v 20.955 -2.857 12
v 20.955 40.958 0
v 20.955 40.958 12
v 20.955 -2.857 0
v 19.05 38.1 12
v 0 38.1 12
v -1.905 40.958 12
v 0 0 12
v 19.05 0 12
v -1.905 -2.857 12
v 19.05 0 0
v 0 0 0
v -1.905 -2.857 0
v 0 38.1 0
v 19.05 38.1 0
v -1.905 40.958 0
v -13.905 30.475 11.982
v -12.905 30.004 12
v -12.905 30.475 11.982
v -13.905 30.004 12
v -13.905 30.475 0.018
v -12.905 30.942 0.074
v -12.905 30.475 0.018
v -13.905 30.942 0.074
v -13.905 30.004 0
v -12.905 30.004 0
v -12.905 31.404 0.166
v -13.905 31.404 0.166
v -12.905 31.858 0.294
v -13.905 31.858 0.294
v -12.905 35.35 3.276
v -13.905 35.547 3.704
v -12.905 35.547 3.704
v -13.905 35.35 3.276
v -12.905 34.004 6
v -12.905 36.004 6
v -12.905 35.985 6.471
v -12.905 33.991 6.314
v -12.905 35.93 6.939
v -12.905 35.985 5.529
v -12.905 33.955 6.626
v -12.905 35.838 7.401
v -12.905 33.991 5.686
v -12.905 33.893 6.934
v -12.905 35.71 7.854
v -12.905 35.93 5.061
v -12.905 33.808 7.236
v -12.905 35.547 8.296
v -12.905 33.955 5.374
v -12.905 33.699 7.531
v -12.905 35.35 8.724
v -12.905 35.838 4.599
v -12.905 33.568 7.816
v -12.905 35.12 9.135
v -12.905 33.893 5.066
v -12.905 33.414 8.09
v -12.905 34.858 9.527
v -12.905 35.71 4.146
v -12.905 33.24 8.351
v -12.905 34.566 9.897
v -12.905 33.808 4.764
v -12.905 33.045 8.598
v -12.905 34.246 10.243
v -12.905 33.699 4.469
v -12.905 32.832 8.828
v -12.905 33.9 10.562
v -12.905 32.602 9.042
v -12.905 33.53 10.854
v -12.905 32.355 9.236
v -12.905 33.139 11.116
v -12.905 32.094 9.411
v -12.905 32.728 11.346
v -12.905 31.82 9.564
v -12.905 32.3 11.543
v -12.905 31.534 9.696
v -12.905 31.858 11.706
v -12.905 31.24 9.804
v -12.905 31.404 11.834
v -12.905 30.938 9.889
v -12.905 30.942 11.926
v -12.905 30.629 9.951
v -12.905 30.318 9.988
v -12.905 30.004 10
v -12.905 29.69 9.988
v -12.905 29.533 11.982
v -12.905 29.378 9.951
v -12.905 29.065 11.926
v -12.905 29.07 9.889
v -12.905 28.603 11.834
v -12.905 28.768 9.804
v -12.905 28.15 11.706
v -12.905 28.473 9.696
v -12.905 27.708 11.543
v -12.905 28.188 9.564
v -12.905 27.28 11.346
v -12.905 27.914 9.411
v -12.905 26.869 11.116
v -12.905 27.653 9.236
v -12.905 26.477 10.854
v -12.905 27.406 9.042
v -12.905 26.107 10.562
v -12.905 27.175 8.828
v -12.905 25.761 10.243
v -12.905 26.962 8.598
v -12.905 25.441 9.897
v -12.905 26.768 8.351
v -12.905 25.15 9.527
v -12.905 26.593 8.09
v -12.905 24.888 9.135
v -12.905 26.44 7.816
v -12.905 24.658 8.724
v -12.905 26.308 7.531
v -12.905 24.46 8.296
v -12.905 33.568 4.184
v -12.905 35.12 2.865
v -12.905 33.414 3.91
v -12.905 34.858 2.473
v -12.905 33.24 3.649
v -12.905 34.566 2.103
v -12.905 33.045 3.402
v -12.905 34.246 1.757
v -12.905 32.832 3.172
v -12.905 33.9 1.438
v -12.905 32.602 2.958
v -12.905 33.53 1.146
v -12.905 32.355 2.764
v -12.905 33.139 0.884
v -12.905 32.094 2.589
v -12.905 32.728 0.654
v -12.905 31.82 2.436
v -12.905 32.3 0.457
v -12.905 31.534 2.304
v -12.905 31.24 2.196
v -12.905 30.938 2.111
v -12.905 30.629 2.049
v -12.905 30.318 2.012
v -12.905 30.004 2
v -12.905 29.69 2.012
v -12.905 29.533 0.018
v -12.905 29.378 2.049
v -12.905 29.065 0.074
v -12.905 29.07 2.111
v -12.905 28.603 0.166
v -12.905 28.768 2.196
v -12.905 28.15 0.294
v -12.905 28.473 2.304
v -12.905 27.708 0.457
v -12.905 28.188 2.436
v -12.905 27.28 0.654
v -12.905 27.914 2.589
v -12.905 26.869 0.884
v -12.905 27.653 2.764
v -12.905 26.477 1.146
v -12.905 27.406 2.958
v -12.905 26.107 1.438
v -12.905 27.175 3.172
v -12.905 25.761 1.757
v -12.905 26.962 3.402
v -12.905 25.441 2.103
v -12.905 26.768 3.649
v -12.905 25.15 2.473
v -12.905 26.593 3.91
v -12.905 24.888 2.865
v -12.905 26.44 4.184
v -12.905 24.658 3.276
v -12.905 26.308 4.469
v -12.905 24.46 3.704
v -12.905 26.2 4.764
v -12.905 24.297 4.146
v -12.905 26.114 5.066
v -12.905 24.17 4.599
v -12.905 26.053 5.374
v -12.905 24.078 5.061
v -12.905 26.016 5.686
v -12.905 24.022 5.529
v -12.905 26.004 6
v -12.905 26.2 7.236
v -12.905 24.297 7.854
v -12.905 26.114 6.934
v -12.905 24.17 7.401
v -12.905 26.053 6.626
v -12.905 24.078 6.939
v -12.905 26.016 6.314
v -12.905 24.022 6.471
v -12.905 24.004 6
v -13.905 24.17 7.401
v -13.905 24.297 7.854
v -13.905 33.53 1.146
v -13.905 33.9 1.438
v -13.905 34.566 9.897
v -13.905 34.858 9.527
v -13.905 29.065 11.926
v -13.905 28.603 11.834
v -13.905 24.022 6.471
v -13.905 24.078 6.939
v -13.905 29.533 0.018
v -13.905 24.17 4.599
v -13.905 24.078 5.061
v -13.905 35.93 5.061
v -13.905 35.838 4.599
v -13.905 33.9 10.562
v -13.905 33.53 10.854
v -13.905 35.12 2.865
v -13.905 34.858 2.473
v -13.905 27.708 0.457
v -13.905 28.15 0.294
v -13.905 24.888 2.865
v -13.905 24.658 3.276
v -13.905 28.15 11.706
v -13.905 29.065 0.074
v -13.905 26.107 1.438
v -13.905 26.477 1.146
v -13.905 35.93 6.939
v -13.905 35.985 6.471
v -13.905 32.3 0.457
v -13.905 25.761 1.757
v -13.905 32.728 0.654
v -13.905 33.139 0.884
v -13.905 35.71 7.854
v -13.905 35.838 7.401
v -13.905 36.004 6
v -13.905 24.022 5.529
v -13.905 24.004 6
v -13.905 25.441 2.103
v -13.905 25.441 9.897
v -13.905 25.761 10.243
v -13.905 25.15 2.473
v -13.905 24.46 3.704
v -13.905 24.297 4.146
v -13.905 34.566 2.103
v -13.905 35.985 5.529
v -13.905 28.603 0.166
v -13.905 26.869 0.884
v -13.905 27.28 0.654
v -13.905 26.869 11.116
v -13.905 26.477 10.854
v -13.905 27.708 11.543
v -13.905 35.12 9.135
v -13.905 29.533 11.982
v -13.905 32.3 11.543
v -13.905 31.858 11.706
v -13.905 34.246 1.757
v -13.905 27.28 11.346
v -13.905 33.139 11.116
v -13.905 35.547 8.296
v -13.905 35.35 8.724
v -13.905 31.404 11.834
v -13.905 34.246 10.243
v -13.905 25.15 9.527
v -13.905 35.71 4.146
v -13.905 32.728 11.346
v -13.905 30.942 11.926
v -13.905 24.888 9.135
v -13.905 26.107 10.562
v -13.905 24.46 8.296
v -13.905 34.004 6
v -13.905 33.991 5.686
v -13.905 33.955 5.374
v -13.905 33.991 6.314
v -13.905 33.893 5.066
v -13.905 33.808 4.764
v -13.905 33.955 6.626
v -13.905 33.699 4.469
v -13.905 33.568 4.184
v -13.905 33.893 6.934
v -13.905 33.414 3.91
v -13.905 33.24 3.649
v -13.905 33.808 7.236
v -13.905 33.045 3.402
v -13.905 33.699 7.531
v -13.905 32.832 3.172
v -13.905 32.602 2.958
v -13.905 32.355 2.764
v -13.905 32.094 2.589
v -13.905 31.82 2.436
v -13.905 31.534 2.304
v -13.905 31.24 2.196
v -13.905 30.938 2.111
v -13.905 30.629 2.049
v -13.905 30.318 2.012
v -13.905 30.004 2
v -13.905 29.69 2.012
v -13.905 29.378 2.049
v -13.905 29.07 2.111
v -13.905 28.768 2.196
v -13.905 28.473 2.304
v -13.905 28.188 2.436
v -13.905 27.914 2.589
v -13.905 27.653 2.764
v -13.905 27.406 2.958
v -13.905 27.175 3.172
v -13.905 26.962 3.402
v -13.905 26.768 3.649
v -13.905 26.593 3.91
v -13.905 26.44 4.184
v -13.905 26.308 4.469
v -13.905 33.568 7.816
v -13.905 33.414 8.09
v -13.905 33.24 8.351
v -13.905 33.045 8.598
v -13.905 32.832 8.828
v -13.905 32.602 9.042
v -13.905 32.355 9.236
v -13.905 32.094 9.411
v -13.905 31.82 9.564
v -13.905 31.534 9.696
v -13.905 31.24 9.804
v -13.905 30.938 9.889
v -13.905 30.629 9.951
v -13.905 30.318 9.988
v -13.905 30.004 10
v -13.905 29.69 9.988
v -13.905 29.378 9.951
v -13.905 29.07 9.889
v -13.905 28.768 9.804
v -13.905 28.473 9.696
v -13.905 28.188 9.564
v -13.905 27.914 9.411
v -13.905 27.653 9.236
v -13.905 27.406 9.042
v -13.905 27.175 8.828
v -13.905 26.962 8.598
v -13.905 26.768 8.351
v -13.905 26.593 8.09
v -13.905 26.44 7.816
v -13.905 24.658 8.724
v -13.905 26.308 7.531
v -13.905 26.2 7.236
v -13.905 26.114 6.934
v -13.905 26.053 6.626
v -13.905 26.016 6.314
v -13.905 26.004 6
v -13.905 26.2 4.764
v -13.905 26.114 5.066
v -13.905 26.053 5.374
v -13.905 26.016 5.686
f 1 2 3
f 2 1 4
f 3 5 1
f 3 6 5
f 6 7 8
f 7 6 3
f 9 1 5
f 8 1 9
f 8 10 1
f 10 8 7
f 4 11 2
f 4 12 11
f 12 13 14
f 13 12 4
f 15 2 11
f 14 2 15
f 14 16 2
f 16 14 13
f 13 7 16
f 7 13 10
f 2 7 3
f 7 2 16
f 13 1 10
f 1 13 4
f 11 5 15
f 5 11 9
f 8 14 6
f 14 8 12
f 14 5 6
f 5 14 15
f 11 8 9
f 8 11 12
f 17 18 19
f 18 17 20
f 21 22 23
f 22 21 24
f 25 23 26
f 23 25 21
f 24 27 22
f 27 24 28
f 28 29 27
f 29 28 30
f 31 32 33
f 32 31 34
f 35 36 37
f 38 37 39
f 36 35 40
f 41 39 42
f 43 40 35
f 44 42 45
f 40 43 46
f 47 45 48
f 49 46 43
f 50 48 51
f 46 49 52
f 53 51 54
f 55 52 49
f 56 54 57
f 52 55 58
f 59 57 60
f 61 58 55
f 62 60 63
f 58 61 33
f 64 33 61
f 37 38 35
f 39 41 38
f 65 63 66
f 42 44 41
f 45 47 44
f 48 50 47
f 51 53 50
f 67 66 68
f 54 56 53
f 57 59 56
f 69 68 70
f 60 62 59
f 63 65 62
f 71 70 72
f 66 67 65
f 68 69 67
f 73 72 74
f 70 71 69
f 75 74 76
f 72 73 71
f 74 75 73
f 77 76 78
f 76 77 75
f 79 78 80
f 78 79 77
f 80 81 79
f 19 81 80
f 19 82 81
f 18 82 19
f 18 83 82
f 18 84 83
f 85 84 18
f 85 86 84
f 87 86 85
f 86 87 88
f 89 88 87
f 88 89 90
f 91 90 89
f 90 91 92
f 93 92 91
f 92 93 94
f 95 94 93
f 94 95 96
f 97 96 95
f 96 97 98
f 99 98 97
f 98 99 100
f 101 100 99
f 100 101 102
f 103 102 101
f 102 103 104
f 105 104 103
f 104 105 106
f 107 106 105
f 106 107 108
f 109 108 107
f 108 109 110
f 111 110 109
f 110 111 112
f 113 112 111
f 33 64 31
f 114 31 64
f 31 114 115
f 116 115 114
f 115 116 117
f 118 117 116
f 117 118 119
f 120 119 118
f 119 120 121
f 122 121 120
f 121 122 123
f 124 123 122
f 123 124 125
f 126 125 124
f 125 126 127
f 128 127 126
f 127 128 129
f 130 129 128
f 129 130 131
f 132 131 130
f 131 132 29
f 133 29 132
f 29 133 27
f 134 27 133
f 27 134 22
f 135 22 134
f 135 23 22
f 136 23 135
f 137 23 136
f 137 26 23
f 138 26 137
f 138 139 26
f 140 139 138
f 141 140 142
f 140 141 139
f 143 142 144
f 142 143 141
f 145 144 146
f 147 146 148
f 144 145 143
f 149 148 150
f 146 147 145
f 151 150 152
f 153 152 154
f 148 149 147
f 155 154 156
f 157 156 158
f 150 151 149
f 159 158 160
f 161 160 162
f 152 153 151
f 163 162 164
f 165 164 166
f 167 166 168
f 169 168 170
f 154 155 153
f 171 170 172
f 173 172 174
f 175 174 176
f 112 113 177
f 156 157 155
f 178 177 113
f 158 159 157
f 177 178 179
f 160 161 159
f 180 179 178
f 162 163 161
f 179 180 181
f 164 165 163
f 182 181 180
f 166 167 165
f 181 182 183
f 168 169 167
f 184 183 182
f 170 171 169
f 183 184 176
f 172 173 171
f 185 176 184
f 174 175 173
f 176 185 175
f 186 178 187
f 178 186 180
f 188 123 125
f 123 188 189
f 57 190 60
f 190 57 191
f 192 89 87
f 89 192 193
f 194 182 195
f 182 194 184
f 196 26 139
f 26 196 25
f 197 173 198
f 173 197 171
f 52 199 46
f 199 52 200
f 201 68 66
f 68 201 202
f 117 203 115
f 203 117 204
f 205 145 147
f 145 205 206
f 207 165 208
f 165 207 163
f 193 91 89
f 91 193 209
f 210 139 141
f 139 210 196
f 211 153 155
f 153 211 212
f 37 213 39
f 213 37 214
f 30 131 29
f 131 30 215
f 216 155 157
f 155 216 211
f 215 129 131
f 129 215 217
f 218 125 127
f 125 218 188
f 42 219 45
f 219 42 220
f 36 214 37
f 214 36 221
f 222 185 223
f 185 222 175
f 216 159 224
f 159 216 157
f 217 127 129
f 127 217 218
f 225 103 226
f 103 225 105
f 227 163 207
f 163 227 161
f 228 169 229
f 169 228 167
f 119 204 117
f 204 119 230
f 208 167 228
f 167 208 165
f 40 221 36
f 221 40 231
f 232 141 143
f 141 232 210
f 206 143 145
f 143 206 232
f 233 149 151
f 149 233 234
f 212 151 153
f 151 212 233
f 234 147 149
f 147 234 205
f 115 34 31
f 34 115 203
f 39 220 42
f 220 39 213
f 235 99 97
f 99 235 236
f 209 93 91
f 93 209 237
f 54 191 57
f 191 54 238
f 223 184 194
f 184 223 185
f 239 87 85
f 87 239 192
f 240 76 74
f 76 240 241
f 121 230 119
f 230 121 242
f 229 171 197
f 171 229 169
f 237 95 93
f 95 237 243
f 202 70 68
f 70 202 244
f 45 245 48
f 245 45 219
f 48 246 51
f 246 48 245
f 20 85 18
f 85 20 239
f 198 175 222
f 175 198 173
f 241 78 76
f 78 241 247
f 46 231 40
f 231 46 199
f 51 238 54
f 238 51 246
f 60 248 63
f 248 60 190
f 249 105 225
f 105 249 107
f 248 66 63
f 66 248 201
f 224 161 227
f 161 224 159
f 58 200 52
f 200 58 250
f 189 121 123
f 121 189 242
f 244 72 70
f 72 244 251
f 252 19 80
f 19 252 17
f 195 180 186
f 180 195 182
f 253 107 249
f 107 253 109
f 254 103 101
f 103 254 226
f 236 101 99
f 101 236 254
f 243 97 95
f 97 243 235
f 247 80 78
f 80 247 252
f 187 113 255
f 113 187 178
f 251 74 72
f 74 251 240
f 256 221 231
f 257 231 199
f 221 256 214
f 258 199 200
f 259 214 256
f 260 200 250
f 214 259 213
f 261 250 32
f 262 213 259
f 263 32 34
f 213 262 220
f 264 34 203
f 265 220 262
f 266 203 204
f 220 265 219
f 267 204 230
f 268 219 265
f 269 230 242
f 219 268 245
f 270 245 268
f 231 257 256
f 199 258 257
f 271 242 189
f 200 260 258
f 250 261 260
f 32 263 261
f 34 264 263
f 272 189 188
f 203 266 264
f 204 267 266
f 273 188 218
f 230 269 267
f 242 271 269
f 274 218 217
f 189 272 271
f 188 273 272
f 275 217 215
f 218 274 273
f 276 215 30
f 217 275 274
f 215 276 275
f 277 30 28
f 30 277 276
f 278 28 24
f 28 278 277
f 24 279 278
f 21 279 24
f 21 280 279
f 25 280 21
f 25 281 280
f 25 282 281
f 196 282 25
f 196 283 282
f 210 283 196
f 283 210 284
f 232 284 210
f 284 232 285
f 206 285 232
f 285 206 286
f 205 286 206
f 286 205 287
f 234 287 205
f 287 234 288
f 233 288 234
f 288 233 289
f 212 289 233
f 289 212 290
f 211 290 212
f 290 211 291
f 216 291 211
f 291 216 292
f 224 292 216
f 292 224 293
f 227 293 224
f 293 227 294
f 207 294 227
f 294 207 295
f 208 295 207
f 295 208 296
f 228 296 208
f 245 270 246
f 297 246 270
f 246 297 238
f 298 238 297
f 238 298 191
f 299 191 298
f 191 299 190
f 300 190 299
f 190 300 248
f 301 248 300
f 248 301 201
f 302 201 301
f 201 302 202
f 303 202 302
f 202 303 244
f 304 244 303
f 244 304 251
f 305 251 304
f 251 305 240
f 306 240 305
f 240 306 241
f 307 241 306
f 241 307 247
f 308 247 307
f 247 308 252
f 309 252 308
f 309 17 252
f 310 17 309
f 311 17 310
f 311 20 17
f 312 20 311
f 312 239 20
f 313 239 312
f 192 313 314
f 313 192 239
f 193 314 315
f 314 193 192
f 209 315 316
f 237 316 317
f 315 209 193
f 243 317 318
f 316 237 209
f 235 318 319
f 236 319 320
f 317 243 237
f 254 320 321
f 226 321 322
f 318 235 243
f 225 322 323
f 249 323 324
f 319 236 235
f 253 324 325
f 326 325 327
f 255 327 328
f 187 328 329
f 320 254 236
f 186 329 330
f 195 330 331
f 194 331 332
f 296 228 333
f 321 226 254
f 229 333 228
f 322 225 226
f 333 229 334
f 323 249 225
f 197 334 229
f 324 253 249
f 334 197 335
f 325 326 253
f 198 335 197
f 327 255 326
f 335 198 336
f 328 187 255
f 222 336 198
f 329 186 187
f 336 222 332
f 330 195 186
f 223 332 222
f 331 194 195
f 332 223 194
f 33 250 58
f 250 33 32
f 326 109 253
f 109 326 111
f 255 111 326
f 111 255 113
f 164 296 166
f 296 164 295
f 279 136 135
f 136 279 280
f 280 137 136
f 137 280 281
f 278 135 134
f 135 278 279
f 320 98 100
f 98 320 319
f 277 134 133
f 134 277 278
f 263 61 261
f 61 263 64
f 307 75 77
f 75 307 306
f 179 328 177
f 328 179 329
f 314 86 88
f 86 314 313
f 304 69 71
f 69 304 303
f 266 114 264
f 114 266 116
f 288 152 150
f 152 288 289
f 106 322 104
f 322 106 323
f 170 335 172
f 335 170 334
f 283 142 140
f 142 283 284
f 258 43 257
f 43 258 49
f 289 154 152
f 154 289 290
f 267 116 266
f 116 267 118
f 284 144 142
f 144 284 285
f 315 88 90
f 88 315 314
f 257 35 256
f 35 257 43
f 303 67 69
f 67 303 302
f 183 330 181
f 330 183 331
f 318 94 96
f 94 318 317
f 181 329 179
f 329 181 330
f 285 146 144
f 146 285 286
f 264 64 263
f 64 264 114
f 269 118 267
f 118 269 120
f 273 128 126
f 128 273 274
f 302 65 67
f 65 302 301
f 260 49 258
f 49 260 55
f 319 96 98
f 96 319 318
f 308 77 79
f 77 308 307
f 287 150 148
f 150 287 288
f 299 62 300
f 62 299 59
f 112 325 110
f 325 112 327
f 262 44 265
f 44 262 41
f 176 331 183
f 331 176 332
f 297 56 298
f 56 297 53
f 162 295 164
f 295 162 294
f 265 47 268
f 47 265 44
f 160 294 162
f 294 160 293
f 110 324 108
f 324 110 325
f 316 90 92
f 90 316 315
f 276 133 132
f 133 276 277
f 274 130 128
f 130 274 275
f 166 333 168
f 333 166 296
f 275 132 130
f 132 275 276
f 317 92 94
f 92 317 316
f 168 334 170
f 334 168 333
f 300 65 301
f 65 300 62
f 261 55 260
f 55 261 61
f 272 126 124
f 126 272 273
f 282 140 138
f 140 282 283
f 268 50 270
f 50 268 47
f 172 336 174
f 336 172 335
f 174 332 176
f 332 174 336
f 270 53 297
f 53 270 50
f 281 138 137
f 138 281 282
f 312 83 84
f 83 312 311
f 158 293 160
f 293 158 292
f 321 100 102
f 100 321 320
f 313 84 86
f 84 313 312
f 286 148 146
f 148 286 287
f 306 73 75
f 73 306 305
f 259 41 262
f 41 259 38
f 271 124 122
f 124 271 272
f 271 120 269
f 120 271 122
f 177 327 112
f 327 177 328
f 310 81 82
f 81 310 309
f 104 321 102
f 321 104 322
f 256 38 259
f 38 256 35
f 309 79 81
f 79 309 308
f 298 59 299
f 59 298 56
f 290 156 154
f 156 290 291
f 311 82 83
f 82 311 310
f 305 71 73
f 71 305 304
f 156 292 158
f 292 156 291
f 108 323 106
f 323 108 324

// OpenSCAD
// file: ../modules/wood.scad
$fn = 80;
mmToIn = 25.4;
one    = 0.75 * mmToIn;
two    = 1.5  * mmToIn;
four   = 3.5  * mmToIn;

module 1x2(length){
     cube([one,two,length*mmToIn],0);
}
module 2x4(length){
     cube([two,four,length*mmToIn],0);
}

module 1x4(length){
     cube([one,four,length*mmToIn],0);
}
// main file
$fn = 80;
include <../modules/wood.scad>

drillDepth = 12;
mmToIn = 25.4;
one    = 0.75 * mmToIn;
two    = 1.5  * mmToIn;
union(){

	difference(){
		translate([-one*0.1,-two*0.075,0])cube([one*1.2,two*1.15,12],0);
		1x2(one/2);
		translate([0,two*1.15*3/4,0])translate([-one*0.1-drillDepth,-two*0.075,6])rotate([0,90,0])cylinder(d=8,h=drillDepth+8,true);
	}
	translate([0,two*1.15*3/4,0])translate([-one*0.1-drillDepth,-two*0.075,6])rotate([0,90,0])difference(){
		cylinder(d=12,h=drillDepth,true);
		cylinder(d=8,h=drillDepth+8,true);
	}
	
}
